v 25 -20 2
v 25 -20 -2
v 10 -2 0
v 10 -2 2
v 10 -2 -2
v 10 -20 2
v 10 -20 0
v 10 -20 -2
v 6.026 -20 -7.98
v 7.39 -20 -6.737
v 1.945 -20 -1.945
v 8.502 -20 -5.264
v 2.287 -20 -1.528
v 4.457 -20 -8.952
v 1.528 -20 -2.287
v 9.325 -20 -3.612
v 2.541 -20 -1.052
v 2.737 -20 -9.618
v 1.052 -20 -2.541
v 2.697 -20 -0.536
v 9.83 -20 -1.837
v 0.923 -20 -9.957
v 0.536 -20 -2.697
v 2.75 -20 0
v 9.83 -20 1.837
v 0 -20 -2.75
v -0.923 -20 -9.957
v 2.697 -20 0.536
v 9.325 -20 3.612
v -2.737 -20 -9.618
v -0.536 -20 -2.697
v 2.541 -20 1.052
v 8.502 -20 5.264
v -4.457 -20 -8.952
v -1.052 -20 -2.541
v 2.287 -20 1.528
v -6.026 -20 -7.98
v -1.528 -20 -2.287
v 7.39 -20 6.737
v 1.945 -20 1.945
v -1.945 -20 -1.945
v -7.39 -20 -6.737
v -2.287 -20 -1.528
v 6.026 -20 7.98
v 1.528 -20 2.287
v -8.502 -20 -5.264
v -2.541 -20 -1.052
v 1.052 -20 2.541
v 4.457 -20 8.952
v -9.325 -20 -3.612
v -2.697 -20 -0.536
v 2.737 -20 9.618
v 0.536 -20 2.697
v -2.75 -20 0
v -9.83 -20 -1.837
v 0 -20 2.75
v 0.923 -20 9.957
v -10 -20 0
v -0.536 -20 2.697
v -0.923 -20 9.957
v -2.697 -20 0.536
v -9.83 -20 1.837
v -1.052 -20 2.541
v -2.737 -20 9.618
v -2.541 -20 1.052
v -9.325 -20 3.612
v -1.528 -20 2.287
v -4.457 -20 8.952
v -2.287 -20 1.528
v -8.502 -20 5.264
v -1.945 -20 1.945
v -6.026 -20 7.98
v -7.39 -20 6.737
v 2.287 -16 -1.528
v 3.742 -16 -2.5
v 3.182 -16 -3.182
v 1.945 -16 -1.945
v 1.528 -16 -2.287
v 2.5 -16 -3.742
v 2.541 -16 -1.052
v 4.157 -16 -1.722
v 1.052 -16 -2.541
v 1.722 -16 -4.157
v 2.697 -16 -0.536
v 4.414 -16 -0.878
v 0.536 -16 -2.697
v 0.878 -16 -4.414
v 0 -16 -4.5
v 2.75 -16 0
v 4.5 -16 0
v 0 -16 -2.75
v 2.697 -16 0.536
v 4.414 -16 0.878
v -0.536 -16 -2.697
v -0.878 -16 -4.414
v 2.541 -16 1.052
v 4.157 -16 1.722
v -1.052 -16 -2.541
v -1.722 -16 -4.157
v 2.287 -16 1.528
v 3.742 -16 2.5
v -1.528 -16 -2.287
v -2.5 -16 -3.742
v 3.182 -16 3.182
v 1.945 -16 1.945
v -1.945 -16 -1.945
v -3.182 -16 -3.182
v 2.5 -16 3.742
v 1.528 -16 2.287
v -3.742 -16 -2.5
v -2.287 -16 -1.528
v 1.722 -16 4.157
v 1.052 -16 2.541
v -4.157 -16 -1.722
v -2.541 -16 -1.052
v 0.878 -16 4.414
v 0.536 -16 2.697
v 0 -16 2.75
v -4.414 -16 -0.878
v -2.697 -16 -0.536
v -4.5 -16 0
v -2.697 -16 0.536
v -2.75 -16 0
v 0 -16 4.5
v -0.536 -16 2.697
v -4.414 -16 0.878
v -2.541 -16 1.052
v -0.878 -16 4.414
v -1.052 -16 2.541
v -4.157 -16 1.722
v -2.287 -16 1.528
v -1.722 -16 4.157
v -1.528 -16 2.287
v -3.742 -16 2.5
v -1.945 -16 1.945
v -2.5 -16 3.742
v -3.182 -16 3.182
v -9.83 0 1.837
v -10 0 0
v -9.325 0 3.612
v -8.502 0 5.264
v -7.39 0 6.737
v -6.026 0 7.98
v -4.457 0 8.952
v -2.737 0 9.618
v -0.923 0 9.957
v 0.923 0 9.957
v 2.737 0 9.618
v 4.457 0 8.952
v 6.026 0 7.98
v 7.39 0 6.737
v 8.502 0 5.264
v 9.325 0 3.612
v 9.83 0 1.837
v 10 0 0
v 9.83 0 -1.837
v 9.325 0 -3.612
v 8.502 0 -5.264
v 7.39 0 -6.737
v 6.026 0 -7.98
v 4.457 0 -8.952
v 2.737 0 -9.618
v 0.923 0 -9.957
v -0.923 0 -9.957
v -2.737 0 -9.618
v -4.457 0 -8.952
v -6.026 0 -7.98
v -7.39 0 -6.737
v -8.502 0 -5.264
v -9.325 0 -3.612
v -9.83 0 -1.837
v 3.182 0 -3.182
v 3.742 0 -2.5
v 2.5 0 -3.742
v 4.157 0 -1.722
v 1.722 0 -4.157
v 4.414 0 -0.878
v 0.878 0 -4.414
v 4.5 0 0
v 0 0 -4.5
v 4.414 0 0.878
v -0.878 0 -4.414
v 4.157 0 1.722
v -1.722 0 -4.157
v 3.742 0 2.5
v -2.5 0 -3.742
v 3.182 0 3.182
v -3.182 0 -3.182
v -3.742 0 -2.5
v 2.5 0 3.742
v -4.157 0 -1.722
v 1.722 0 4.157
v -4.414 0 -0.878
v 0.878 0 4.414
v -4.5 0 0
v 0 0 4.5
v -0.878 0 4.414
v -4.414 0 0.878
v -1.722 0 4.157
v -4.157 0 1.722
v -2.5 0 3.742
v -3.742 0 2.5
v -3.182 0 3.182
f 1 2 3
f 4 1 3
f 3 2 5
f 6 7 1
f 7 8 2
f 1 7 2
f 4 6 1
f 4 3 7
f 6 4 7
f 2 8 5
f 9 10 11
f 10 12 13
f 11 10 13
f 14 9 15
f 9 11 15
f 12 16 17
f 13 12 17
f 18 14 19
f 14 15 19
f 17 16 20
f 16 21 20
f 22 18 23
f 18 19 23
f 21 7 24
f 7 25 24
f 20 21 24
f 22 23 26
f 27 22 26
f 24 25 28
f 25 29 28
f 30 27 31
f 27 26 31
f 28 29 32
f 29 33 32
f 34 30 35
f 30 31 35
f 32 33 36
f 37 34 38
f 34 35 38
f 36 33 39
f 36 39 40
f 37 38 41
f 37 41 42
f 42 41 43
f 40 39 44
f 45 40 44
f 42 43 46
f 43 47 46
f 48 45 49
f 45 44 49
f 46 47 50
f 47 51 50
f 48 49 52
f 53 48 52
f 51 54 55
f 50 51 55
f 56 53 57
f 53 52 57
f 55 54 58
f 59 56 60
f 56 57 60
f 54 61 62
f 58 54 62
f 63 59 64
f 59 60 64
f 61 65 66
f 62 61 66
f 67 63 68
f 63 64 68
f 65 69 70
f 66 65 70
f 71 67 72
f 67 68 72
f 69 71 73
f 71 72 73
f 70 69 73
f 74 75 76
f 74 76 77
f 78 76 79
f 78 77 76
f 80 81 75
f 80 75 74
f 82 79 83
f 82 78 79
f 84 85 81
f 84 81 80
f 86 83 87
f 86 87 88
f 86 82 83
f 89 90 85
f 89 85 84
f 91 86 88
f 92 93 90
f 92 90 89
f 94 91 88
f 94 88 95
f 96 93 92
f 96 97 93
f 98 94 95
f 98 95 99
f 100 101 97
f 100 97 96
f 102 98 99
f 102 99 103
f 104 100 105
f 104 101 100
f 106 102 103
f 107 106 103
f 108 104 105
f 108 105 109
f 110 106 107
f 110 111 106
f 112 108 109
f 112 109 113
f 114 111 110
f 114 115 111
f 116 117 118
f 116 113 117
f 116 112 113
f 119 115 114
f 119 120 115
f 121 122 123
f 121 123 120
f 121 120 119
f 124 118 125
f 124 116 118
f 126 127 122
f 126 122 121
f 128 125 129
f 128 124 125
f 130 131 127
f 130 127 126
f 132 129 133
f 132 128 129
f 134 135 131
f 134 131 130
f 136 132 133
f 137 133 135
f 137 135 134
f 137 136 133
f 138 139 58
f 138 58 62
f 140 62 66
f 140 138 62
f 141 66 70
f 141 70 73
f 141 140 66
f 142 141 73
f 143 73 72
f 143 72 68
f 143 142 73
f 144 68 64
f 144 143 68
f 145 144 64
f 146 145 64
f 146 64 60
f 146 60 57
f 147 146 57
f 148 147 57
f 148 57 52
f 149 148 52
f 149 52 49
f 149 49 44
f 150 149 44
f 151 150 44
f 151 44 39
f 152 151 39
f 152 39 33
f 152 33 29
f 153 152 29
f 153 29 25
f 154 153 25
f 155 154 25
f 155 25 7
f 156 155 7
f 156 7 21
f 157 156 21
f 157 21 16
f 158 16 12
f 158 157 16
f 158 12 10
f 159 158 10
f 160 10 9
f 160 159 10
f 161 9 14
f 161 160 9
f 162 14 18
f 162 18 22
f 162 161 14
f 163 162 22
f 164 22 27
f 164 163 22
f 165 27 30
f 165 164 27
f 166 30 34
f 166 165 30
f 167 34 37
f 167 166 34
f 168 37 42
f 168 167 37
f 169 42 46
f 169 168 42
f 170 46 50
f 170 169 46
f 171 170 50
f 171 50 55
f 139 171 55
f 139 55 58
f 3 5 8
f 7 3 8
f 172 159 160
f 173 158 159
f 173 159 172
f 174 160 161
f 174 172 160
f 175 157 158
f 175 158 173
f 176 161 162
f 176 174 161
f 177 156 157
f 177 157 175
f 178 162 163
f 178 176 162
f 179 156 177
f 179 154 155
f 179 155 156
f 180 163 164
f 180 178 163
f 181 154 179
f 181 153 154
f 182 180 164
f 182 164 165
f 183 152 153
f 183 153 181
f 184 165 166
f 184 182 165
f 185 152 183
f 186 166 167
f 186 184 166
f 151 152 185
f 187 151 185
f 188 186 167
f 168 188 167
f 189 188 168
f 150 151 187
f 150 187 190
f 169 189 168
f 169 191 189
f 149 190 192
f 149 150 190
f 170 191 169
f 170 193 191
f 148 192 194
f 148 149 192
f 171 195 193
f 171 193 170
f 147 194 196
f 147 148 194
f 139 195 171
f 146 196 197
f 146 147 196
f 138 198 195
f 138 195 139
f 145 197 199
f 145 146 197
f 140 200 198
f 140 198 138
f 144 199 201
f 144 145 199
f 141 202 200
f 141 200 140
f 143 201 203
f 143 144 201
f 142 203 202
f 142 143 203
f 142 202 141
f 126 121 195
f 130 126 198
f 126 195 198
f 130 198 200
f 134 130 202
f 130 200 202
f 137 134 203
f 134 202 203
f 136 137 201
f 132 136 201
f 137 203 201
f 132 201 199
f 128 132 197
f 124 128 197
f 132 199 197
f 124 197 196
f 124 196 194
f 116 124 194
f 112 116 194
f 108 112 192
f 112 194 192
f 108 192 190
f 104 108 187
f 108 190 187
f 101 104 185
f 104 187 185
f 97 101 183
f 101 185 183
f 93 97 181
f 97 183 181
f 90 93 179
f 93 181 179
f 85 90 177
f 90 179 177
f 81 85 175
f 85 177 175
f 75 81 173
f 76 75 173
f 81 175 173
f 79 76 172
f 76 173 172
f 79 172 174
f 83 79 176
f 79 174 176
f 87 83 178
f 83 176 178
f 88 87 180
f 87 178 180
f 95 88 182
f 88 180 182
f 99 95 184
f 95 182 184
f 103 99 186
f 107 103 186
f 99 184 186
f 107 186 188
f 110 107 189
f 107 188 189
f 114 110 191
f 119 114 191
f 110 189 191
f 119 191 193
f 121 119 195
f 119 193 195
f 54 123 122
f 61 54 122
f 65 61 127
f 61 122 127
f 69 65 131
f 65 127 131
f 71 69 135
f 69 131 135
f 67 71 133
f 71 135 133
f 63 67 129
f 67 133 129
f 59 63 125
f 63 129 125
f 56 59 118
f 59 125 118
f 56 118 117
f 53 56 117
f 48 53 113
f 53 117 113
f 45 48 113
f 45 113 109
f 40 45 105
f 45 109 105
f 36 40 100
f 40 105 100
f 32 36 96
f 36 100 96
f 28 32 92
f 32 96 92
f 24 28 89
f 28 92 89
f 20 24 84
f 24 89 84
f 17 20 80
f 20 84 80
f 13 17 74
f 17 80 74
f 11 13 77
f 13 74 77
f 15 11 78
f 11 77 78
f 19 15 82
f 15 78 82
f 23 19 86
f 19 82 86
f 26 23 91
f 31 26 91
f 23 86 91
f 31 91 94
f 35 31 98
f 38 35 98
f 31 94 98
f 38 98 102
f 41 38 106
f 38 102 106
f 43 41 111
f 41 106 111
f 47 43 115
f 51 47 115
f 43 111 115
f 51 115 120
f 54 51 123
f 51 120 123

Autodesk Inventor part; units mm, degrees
ref_plane "YZ Plane" through (0, 0, 0) normal (1, 0, 0) x (0, 1, 0)
ref_plane "XY Plane" through (0, 0, 0) normal (0, 0, 1) x (1, 0, 0)
sketch "Sketch1" plane through (0, 0, 0) normal (0, 1, 0) x (-1, 0, 0)
  circle A0 centre (0, 0) radius 4.5
  circle A1 centre (0, 0) radius 10
  dimension "d0" = 9
  dimension "d1" = 20
extrude "Extrusion1" add sketch "Sketch1" against normal blind 20 contours A0 | A1
extrude "Extrusion2" cut sketch "Sketch1" against normal blind 16 contours A0
sketch "Sketch2" plane through (0, 0, 0) normal (0, 0, 1) x (1, 0, 0)
  line L0 (-10, -20) -> (10, -20) construction
  line L1 (10, 0) -> (-10, 0) construction
  line L2 (10, -20) -> (25, -20)
  line L3 (25, -20) -> (10, -2)
  line L4 (10, -2) -> (10, -20)
  line L5 (10, 0) -> (10, -20) construction
  point P0 (0, 0)
  dimension "d6" = 15
  dimension "d7" = 18
extrude "Extrusion3" add sketch "Sketch2" along normal mid plane 4
ref_plane "Work Plane1" through (0, -16, 0) normal (0, 1, 0) x (-1, 0, 0)
sketch "Sketch3" plane through (0, -16, 0) normal (0, 1, 0) x (-1, 0, 0)
  circle A0 centre (0, 0) radius 2.75
  dimension "d11" = 5.5
extrude "Extrusion4" cut sketch "Sketch3" against normal through all
properties part number "cilindro_obj2"
